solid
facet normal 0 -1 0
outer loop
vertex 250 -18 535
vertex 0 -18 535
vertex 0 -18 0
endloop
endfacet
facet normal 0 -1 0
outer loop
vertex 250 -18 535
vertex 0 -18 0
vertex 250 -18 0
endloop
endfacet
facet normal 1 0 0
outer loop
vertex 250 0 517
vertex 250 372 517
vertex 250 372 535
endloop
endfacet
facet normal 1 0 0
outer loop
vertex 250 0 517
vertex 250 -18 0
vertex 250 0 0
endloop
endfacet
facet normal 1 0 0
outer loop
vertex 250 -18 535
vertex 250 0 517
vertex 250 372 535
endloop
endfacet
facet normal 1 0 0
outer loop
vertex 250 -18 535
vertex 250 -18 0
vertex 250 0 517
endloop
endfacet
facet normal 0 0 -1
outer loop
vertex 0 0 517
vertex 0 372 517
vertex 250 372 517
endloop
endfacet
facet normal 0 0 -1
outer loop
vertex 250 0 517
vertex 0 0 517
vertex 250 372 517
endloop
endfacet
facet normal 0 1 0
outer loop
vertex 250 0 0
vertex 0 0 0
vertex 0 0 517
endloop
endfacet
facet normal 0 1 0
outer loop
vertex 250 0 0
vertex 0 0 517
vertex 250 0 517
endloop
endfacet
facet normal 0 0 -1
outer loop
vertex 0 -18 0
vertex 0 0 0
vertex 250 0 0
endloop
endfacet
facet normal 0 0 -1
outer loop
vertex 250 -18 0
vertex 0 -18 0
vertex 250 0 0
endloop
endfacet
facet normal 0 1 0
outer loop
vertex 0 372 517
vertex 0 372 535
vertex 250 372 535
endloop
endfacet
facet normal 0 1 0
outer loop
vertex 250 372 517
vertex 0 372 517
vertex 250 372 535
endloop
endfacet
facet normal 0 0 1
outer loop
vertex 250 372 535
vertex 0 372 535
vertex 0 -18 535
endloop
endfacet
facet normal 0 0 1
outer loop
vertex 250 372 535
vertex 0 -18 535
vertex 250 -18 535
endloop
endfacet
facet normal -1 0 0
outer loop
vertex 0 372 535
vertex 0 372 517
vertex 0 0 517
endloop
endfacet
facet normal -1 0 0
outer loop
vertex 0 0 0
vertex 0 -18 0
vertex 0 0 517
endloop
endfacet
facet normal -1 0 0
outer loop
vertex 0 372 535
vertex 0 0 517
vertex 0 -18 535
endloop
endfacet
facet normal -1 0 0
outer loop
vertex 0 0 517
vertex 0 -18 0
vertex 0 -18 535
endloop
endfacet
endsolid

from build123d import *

# Parameters (mm, degrees)
F0_W     = 250
F0_H     = 517
F1_DEPTH = 18
F2_W     = 250
F2_H     = 18
F3_DEPTH = 390


with BuildPart() as f1:
    # F0 (on Front) → F1 (new body)
    with BuildSketch(Plane.XZ):
        with Locations((125, 258.5)):
            Rectangle(F0_W, F0_H)
    extrude(amount=F1_DEPTH)

    # F2 (on face) → F3 (join)
    with BuildSketch(Plane.XZ.offset(18)):
        with Locations((125, 526)):
            Rectangle(F2_W, F2_H)
    extrude(amount=-F3_DEPTH)


solid = f1.part
